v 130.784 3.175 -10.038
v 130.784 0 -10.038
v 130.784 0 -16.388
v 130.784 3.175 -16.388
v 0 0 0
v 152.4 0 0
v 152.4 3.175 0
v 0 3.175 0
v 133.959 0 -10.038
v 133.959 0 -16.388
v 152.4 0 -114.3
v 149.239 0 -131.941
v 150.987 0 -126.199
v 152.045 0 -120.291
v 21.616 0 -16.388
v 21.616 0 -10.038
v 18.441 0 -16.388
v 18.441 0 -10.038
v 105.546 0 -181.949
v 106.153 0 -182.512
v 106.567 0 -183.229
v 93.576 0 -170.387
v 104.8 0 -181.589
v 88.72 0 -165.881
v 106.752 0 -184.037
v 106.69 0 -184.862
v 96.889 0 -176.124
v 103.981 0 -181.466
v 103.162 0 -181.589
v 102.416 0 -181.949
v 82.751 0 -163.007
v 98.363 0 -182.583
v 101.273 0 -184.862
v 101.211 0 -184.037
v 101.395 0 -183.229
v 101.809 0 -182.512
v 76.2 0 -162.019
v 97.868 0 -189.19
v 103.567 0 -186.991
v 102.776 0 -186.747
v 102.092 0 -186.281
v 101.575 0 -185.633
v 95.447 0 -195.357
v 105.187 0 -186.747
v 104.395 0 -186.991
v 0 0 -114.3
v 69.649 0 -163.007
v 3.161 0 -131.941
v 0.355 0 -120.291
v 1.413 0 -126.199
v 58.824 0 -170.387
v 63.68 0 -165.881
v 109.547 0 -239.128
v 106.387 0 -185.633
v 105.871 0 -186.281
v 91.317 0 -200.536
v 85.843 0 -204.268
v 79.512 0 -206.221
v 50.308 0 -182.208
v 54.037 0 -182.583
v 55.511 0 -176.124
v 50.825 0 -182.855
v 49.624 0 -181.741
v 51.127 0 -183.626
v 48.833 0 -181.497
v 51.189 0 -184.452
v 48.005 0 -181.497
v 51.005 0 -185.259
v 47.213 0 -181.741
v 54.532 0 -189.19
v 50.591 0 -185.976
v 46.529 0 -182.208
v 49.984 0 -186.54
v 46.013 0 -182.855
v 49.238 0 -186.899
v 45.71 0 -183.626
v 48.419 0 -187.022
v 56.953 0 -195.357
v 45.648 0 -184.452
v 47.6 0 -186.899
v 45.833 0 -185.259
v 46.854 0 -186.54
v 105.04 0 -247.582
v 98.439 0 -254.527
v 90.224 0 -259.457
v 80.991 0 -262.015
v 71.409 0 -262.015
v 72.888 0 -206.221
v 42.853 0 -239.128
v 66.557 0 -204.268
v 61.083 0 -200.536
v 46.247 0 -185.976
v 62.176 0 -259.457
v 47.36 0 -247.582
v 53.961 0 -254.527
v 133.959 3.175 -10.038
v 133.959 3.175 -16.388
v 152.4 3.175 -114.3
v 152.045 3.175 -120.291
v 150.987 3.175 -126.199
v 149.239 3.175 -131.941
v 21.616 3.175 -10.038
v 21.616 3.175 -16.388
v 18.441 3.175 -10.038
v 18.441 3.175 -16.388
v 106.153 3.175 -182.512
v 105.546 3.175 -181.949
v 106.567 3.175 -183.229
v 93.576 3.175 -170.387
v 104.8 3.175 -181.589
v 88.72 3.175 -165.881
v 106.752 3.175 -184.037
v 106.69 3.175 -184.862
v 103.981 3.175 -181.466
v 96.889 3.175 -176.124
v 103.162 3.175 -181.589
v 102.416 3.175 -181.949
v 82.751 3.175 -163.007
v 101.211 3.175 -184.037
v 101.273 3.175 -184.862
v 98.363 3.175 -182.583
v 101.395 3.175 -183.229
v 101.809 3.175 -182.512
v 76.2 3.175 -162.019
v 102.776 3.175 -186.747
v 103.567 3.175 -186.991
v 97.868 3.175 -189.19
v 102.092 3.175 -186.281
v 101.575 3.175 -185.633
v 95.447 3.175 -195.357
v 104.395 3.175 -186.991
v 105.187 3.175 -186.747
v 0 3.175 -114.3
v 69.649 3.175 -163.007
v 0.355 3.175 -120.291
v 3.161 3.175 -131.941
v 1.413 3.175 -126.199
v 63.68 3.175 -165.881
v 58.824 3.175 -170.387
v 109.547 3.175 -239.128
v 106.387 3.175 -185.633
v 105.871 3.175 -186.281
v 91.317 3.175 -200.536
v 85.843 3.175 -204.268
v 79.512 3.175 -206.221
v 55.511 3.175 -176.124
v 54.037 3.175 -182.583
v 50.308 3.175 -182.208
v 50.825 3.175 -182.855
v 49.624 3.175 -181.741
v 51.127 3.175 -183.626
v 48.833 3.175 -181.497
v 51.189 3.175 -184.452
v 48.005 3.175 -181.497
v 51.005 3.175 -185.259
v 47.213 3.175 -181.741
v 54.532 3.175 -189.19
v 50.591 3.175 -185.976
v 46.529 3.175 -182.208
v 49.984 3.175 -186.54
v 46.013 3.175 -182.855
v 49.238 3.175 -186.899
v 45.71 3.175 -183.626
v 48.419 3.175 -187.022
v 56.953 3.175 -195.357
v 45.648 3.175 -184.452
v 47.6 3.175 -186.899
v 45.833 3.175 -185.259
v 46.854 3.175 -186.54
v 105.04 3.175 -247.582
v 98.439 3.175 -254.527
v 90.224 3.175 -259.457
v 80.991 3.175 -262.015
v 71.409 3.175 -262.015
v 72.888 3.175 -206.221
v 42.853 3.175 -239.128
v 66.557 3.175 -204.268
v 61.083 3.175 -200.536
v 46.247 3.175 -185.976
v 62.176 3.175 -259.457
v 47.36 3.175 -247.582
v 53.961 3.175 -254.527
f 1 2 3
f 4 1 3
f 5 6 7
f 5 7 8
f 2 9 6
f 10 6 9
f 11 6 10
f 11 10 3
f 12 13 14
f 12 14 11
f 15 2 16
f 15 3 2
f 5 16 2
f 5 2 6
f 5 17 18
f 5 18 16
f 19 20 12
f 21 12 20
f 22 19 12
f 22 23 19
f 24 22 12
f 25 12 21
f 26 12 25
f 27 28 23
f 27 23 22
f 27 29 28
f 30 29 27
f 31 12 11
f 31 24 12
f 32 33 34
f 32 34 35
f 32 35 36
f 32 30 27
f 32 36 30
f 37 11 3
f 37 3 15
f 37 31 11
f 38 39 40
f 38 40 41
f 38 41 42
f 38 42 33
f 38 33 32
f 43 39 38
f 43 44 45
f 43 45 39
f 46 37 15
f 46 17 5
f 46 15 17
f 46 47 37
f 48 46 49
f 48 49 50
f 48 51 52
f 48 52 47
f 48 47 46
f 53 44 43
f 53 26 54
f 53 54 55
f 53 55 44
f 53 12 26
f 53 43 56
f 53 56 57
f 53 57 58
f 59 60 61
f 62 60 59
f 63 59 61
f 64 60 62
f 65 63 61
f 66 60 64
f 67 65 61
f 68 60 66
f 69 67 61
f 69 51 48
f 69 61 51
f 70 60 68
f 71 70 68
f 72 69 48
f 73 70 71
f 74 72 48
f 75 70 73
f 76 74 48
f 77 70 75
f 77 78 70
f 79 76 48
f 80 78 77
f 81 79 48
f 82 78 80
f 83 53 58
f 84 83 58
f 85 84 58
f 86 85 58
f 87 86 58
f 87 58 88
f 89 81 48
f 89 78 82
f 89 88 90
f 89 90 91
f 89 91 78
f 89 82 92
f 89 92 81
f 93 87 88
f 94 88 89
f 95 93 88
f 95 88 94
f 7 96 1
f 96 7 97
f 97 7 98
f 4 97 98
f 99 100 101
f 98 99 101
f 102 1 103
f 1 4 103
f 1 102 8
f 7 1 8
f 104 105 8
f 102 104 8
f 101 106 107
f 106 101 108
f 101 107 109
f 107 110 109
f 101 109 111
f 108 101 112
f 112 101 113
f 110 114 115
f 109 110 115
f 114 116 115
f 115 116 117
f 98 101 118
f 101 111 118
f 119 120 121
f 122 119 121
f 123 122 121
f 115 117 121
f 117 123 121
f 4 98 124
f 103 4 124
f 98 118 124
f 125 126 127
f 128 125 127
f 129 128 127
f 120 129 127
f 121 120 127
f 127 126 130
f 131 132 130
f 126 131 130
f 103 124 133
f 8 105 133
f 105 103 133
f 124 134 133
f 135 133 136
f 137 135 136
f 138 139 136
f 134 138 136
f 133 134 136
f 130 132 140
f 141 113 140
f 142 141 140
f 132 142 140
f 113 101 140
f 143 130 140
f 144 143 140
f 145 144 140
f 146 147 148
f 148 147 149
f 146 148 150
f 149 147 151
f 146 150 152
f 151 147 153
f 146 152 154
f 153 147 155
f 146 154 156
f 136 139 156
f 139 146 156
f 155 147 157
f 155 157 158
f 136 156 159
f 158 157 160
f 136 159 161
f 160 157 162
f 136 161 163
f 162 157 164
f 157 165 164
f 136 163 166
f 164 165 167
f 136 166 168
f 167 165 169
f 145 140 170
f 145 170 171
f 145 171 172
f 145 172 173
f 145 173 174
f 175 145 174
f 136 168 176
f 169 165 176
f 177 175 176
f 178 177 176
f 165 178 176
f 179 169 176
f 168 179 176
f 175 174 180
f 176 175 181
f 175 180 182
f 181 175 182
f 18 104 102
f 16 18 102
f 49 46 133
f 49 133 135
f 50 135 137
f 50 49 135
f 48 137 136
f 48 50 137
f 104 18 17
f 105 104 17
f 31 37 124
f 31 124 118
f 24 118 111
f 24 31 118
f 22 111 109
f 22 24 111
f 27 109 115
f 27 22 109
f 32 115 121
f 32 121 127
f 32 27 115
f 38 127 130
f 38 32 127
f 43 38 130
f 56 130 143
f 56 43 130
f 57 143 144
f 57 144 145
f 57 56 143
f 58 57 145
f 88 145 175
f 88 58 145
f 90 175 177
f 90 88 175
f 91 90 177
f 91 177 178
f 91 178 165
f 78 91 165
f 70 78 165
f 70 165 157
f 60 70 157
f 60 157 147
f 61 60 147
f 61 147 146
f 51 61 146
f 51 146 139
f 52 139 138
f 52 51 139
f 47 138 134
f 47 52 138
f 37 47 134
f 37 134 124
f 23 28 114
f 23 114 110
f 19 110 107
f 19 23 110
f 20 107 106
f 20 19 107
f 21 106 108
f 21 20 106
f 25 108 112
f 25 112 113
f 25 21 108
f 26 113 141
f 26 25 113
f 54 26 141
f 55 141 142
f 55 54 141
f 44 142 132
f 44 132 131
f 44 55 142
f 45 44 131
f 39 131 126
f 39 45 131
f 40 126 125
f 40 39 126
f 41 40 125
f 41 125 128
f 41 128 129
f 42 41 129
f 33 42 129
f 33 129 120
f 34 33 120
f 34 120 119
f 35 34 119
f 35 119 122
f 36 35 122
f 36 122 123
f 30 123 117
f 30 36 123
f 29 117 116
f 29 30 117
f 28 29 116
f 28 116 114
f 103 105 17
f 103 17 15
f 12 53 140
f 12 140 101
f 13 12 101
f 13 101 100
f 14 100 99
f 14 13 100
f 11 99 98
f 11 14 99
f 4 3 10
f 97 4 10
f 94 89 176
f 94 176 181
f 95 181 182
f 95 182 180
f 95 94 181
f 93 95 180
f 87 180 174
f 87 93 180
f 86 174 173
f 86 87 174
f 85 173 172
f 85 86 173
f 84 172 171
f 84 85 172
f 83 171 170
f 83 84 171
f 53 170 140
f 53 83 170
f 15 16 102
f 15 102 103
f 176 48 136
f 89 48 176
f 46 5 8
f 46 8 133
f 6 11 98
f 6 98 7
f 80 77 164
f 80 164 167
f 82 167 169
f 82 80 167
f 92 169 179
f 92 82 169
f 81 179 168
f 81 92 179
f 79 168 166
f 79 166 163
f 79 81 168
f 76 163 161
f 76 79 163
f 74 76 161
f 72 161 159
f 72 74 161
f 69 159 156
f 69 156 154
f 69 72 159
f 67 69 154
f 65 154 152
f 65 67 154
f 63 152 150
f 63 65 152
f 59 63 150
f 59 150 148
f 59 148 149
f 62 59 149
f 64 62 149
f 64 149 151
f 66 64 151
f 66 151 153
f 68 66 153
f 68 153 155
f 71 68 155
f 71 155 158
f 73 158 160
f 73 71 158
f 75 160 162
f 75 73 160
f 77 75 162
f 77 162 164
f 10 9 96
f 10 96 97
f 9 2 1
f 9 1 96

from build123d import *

# Parameters (mm, degrees)
SKETCH3_R           = 22.225
SKETCH3_R_2         = 2.778125
SKETCH3_W           = 3.175
SKETCH3_H           = 6.35
BOSS_EXTRUDE1_DEPTH = 3.175


with BuildPart() as part:
    # Sketch3 → Boss-Extrude1 (new body)
    with BuildSketch(Plane(origin=(0, 0, 0), x_dir=(1, 0, 0), z_dir=(0, 1, 0))):
        with BuildLine():
            Line((0, 0), (0, 114.3))
            ThreePointArc((0, 114.3), (0.796571799, 123.260868714), (3.161305831, 131.940714778))
            Line((3.161305831, 131.940714778), (42.852914082, 239.127776658))
            ThreePointArc((42.852914082, 239.127776658), (76.2, 262.339276313), (109.547085918, 239.127776658))
            Line((109.547085918, 239.127776658), (149.238694169, 131.940714778))
            ThreePointArc((149.238694169, 131.940714778), (151.603428201, 123.260868714), (152.4, 114.3))
            Line((152.4, 114.3), (152.4, 0))
            Line((152.4, 0), (0, 0))
        make_face()
        with Locations(Location((76.2, 184.24413735, 0), (0, 0, 270))):
            Circle(SKETCH3_R, mode=Mode.SUBTRACT)
        with Locations(Location((103.98125, 184.24413735, 0), (0, 0, 270))):
            Circle(SKETCH3_R_2, mode=Mode.SUBTRACT)
        with Locations(Location((48.41875, 184.24413735, 0), (0, 0, 90))):
            Circle(SKETCH3_R_2, mode=Mode.SUBTRACT)
        with Locations((20.0285604, 13.212735966)):
            Rectangle(SKETCH3_W, SKETCH3_H, mode=Mode.SUBTRACT)
        with Locations((132.3714396, 13.212735966)):
            Rectangle(SKETCH3_W, SKETCH3_H, mode=Mode.SUBTRACT)
    extrude(amount=BOSS_EXTRUDE1_DEPTH)


solid = part.part
